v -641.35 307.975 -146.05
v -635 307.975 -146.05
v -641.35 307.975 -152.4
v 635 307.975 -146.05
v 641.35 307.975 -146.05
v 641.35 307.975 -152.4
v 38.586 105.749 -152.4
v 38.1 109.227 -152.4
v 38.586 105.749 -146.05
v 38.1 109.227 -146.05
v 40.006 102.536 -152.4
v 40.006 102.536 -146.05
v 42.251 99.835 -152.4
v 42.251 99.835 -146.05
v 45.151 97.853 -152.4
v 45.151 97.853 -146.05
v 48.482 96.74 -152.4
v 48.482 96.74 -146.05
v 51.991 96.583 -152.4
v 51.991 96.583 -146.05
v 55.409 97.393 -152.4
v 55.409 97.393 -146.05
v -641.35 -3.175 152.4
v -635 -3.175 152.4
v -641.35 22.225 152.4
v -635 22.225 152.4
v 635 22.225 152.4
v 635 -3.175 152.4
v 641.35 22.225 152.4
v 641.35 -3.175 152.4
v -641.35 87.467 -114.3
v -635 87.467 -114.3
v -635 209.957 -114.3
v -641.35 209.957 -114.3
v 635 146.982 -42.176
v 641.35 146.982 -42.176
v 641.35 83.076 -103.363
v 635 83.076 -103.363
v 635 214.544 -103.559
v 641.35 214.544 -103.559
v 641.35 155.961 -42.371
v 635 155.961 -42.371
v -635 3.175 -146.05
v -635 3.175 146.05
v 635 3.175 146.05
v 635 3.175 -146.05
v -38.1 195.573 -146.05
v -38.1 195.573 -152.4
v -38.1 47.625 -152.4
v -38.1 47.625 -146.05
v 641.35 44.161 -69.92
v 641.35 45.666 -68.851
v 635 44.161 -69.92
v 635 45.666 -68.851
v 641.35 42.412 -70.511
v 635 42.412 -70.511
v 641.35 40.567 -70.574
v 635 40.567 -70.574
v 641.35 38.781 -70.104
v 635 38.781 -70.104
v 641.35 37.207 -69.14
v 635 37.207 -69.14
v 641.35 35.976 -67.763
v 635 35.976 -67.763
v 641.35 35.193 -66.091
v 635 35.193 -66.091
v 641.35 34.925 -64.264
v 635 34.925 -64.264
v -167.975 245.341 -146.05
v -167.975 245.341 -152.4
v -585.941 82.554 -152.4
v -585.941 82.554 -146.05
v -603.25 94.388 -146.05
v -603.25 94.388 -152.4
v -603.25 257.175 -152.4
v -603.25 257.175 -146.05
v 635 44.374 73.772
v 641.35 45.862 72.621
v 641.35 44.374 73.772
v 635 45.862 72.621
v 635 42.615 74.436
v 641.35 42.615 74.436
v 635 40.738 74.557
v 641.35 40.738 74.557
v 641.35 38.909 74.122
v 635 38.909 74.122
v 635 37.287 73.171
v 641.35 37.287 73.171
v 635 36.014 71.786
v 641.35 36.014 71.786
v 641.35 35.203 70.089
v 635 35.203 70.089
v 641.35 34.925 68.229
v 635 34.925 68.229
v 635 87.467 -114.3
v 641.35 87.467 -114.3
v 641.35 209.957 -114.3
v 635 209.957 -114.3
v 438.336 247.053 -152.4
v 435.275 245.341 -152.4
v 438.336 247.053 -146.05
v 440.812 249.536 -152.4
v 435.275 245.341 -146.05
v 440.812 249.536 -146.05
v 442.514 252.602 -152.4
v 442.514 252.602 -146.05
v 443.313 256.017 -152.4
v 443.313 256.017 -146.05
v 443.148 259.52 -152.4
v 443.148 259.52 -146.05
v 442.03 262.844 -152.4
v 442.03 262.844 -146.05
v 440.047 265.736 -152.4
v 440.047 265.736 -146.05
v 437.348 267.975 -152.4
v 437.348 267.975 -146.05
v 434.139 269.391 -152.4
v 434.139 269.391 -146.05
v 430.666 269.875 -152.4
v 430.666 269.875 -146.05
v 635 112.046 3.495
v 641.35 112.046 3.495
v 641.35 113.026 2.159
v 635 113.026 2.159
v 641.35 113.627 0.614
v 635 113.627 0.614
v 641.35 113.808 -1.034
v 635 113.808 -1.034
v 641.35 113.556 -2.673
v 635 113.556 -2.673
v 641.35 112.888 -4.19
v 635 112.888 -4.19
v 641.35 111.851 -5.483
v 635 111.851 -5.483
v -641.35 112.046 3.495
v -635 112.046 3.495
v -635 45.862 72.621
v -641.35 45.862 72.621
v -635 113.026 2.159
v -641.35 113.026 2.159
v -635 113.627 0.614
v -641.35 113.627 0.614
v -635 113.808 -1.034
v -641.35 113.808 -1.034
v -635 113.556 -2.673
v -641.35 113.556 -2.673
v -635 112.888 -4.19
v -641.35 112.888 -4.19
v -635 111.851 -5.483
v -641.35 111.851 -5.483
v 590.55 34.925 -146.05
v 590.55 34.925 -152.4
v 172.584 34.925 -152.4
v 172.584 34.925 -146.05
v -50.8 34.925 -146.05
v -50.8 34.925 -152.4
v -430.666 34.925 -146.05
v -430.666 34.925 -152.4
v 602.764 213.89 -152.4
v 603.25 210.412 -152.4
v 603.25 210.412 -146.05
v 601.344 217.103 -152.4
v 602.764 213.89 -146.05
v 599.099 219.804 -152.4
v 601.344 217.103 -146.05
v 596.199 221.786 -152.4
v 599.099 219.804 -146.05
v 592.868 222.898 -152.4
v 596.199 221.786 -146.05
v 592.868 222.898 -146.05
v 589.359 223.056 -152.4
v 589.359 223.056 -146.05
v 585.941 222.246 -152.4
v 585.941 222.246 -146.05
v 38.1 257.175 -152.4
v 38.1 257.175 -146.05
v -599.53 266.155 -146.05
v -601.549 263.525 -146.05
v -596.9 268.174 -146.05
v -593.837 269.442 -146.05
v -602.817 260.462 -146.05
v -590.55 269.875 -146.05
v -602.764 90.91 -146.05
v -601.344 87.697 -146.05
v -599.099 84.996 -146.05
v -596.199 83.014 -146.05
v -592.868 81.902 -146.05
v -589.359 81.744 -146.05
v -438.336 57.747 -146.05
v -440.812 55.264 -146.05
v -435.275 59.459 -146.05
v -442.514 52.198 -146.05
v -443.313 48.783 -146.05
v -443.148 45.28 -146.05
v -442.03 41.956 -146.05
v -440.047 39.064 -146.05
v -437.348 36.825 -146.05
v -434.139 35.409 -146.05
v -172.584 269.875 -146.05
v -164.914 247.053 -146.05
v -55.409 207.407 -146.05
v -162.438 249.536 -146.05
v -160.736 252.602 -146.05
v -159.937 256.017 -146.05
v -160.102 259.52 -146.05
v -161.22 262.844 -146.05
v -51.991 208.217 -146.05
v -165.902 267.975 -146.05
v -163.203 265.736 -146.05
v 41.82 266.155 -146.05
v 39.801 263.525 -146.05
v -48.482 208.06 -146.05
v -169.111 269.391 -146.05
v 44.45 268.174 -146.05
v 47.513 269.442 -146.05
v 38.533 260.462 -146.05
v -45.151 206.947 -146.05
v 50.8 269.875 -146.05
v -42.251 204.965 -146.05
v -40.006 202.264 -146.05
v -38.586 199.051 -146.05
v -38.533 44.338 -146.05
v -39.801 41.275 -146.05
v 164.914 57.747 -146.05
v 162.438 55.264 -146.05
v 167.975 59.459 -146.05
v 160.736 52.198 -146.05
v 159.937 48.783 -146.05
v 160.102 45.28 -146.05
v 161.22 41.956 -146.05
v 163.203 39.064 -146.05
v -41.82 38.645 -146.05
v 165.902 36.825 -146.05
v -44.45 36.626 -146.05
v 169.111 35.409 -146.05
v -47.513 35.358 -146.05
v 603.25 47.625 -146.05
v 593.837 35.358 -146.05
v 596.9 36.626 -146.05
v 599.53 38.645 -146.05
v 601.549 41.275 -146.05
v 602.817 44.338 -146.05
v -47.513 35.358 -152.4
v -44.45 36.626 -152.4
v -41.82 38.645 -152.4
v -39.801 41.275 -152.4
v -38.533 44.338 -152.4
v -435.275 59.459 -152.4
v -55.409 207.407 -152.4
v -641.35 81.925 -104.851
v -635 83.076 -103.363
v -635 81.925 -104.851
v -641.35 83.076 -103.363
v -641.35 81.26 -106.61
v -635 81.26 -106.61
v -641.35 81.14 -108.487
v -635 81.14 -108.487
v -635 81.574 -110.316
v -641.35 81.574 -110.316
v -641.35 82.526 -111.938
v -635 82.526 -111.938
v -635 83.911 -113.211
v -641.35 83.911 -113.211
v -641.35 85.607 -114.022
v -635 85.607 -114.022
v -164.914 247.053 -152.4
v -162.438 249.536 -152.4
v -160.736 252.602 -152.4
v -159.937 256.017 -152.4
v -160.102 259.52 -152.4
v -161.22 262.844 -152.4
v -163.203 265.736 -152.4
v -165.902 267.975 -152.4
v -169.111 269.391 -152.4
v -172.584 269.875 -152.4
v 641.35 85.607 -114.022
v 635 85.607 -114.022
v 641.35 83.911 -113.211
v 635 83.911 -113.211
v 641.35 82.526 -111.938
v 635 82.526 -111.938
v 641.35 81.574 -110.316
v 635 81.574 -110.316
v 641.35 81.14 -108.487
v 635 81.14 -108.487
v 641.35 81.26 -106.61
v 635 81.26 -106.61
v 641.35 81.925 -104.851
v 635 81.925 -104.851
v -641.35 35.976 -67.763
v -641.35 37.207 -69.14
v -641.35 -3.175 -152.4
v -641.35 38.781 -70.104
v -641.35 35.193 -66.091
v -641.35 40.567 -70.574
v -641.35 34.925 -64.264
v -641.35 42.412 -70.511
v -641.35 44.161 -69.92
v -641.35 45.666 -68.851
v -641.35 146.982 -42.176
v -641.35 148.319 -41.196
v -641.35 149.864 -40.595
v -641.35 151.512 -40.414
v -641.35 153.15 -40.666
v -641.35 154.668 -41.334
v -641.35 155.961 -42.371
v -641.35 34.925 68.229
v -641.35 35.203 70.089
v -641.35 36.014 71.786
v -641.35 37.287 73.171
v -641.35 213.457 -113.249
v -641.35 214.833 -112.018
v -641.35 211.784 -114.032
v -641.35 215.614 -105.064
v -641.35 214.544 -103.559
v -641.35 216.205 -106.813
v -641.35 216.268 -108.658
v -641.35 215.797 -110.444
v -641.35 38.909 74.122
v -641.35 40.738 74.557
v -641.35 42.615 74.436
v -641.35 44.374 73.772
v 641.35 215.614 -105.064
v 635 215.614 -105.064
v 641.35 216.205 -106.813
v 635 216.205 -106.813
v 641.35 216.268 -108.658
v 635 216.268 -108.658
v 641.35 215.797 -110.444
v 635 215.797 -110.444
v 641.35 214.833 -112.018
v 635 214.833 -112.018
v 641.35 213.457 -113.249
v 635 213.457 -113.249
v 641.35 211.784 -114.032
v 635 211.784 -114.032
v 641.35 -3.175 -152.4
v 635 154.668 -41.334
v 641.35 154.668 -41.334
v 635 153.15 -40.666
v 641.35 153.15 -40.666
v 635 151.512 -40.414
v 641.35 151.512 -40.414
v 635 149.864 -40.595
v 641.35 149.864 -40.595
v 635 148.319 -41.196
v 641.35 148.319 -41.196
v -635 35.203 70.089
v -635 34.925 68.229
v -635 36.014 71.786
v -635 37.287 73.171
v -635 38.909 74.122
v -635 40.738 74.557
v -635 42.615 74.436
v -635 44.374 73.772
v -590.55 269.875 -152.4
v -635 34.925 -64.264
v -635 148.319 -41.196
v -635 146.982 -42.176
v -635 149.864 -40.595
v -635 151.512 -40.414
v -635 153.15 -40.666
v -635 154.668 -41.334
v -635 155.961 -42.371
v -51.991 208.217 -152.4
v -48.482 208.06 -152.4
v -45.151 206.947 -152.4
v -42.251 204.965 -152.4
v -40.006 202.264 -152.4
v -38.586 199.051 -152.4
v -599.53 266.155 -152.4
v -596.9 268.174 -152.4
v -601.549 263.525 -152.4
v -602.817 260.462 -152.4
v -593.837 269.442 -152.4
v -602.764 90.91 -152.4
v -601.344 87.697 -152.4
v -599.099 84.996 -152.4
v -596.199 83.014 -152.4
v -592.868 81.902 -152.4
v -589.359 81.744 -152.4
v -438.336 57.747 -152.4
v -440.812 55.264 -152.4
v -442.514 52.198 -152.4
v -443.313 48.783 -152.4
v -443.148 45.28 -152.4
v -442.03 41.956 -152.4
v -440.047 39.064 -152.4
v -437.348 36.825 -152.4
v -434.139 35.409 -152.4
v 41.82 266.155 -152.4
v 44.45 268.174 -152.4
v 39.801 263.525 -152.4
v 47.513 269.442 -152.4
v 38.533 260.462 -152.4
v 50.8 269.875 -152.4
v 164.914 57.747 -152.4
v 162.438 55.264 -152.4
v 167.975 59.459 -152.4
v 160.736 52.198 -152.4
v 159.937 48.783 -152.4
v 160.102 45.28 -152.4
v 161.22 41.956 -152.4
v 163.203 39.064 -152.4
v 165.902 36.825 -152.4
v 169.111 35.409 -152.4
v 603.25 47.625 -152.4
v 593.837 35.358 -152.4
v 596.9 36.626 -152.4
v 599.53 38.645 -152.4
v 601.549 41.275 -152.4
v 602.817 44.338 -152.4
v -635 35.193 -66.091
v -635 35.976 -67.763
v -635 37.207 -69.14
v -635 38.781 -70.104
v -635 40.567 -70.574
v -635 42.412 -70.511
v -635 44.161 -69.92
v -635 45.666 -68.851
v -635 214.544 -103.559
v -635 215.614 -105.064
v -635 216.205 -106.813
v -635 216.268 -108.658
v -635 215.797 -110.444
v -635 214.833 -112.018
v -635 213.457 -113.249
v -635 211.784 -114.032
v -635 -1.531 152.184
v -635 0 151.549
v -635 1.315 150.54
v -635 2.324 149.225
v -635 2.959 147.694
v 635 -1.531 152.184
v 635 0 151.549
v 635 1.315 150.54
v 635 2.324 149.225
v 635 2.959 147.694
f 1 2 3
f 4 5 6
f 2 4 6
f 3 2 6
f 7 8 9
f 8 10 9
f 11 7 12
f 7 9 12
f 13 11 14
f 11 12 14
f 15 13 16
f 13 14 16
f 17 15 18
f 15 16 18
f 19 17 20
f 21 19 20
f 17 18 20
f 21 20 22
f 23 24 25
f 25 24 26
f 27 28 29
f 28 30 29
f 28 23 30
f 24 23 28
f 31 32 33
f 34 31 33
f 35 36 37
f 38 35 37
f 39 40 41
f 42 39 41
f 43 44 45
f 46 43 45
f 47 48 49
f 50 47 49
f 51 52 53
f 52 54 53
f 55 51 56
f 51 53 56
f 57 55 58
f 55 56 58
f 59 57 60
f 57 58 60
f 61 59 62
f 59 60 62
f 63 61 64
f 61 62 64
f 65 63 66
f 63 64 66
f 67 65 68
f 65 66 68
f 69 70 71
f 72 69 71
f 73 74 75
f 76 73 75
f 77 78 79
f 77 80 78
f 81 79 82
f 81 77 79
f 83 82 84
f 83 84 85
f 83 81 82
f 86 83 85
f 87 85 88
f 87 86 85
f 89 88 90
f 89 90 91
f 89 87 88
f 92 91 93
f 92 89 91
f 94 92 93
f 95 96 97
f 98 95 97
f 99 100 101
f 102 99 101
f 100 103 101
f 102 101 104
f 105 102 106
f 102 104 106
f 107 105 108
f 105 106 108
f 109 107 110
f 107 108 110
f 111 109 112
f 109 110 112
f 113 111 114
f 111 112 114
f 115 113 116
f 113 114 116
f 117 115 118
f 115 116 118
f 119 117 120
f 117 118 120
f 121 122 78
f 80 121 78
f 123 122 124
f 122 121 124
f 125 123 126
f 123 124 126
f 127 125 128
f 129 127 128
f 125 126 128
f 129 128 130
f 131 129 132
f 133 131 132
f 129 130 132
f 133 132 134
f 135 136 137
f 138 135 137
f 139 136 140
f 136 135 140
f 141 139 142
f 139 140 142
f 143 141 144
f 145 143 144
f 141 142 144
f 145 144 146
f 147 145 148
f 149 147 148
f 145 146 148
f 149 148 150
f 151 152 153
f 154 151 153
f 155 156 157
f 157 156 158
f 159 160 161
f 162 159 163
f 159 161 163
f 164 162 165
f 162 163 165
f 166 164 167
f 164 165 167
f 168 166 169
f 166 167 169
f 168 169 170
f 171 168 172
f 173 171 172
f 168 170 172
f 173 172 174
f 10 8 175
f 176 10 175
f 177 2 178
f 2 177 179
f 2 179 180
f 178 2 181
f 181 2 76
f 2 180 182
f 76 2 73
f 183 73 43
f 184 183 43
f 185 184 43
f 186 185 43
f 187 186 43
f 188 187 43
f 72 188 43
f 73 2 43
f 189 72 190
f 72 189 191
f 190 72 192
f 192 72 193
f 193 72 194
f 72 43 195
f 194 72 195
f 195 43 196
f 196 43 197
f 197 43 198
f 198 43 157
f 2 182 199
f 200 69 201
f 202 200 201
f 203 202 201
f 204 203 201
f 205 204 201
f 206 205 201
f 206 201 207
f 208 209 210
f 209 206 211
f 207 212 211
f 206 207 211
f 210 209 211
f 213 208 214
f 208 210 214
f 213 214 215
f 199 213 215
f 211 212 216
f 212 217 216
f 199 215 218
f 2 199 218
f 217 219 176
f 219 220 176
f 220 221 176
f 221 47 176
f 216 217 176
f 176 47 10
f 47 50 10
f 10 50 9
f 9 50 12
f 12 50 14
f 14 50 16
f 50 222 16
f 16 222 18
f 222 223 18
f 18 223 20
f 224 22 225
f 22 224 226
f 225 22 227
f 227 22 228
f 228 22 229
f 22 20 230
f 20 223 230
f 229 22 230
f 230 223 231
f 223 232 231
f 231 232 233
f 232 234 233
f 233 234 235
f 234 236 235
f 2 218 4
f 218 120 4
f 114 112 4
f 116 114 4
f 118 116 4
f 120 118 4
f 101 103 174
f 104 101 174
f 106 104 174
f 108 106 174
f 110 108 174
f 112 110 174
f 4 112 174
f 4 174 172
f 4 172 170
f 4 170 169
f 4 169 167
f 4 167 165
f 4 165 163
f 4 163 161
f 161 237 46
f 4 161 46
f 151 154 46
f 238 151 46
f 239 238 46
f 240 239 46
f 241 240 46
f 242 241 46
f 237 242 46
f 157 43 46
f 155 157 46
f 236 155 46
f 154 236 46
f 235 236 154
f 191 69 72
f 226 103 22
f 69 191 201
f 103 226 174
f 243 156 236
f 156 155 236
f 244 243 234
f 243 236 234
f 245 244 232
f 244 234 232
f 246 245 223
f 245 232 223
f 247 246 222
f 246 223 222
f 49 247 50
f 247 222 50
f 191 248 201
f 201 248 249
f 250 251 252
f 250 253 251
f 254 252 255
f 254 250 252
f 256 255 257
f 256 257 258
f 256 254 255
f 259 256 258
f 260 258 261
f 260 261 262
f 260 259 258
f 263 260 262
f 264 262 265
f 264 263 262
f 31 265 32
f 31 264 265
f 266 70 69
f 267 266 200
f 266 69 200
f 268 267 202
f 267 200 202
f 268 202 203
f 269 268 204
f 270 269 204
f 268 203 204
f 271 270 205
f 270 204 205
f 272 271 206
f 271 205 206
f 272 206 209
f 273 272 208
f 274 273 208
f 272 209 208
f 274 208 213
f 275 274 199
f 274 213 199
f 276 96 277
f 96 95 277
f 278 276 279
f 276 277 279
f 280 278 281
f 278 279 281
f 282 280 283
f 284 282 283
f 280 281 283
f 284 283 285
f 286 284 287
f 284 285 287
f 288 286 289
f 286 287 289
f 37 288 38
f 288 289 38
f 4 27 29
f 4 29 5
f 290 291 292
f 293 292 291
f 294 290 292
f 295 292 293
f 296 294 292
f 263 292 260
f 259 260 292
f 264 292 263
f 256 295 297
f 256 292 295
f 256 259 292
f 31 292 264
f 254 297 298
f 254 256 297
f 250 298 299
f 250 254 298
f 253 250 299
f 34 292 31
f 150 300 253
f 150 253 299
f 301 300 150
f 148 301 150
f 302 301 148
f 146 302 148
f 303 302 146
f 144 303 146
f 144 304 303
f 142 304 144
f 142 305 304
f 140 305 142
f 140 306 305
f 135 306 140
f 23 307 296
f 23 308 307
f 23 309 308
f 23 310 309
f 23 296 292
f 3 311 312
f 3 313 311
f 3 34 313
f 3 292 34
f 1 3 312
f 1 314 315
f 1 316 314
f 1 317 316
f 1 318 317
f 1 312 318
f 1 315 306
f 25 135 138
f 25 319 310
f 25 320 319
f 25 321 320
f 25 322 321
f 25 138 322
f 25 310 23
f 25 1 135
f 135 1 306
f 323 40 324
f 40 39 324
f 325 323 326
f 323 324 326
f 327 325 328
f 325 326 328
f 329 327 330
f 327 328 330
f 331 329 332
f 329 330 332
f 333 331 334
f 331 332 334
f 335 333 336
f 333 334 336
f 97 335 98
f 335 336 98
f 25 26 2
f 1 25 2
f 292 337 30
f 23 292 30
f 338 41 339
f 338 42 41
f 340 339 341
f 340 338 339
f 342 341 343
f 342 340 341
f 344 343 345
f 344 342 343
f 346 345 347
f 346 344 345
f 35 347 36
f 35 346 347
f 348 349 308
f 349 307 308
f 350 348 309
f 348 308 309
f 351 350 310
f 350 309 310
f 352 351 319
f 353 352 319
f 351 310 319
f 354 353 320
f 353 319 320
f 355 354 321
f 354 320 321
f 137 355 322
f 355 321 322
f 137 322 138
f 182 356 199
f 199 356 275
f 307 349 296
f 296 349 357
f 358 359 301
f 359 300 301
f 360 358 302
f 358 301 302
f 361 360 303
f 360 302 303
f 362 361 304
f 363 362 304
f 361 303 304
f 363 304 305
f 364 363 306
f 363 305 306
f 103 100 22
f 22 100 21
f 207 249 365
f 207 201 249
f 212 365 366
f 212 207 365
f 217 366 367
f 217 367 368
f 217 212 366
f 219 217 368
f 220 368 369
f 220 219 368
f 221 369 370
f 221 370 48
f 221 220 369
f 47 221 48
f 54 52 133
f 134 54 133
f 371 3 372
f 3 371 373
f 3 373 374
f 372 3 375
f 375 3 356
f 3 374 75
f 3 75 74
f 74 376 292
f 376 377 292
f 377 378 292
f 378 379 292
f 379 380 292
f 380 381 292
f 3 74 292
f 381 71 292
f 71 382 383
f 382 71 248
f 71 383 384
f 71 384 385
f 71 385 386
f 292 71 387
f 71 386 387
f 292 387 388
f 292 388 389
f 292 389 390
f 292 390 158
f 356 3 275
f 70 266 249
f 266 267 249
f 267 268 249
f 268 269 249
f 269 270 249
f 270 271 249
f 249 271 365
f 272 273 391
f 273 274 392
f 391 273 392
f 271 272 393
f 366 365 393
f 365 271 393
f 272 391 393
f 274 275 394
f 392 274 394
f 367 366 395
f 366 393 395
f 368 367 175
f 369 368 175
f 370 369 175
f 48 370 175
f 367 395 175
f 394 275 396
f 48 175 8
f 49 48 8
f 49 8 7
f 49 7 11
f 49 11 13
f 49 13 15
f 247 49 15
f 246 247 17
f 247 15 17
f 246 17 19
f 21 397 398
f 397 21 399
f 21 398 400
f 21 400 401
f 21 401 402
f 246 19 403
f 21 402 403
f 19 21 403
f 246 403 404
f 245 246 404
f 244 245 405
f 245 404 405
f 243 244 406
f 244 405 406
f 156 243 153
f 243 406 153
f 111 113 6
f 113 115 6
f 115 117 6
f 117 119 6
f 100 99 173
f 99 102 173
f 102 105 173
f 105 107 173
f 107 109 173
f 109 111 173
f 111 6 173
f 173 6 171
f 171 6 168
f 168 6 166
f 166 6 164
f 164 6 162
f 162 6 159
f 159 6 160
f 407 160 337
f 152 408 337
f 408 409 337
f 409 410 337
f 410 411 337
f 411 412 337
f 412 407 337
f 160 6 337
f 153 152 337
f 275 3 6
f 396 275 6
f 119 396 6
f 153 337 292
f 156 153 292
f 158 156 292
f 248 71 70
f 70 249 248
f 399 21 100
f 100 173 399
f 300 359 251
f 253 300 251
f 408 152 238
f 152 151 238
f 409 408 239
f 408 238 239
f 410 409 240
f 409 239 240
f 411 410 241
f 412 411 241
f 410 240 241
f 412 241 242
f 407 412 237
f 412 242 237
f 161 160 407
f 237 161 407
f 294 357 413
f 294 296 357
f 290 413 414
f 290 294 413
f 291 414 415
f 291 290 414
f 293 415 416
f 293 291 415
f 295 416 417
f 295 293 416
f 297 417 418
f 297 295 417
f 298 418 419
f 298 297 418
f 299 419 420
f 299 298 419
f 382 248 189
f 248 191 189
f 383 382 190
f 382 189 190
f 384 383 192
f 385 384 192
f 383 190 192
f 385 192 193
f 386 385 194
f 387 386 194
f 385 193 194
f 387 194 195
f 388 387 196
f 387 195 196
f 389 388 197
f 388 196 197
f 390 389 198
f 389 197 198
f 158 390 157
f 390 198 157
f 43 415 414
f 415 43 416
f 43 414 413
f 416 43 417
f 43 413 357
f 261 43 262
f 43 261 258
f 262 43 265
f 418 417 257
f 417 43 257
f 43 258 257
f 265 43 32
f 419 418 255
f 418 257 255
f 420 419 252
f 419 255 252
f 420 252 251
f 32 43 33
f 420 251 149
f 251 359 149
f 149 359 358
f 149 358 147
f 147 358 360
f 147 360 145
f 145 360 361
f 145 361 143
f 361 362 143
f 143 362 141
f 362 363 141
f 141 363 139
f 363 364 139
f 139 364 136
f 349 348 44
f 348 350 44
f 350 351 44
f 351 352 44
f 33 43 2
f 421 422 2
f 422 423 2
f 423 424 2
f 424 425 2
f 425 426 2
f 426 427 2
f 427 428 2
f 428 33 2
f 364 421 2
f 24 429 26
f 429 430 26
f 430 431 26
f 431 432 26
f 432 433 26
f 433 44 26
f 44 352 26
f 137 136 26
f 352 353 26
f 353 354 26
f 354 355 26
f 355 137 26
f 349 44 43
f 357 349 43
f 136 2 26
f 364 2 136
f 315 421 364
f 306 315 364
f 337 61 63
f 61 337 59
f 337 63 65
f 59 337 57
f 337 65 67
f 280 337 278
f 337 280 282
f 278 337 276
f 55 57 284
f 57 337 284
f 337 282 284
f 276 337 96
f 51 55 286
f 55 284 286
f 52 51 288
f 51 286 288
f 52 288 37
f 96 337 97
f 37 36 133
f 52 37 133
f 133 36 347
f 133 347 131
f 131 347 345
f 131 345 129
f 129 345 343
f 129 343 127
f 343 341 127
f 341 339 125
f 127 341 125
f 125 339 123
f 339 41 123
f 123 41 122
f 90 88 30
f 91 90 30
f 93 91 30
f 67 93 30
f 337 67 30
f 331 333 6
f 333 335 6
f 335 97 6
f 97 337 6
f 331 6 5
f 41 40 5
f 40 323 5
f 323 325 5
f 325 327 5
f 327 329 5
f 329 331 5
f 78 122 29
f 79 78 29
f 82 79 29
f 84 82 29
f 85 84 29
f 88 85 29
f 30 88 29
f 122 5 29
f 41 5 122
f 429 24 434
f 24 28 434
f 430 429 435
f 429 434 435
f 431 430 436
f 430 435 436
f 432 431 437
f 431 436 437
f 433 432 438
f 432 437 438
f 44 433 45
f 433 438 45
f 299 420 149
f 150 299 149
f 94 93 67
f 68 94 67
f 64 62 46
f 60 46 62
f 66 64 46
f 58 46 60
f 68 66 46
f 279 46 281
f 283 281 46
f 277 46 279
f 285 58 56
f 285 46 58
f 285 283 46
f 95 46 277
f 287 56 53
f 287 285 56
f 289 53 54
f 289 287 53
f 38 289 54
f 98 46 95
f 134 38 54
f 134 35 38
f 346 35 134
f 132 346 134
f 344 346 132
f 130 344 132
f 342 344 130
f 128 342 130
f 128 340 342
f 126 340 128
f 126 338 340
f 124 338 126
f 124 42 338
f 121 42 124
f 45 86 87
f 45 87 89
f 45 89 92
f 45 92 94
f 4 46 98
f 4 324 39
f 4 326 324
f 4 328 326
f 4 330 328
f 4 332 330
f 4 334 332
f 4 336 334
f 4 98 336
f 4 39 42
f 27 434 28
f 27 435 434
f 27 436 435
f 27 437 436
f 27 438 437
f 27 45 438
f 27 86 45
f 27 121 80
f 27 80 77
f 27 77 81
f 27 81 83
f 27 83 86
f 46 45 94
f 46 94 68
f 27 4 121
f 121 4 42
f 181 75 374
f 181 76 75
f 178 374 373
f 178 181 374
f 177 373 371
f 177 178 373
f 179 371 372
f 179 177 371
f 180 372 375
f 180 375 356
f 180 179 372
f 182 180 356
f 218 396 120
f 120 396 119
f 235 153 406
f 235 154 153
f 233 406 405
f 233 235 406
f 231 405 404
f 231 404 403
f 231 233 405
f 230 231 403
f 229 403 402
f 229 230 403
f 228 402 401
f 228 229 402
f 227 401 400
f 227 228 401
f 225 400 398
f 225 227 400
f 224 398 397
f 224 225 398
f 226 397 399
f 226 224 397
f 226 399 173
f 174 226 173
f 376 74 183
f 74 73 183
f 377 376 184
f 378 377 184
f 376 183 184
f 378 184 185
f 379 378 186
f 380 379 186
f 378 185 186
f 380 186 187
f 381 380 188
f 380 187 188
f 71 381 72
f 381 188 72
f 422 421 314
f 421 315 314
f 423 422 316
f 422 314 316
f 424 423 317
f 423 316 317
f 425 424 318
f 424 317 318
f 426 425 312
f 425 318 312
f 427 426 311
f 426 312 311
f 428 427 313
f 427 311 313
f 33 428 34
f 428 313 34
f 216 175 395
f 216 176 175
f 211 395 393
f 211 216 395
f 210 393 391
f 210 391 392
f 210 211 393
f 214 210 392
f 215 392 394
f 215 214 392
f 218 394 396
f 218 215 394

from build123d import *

# Parameters (mm, degrees)
SKETCH1_W           = 1270
SKETCH1_H           = 6.35
BOSS_EXTRUDE1_DEPTH = 152.4
SKETCH2_W           = 1270
SKETCH2_H           = 6.35
BOSS_EXTRUDE2_DEPTH = 304.8
BOSS_EXTRUDE3_DEPTH = 6.35
CUT_EXTRUDE1_DEPTH  = 1328.92833038
FILLET1_R           = 6.35
FILLET2_R           = 6.35
CUT_EXTRUDE2_DEPTH  = 775.003529142
FILLET3_R           = 12.7
FILLET4_R           = 6.35


with BuildPart() as part:
    # Sketch1 → Boss-Extrude1 (new, symmetric)
    with BuildSketch(Plane.XY):
        Rectangle(SKETCH1_W, SKETCH1_H)
    extrude(amount=BOSS_EXTRUDE1_DEPTH, both=True)

    # Sketch2 → Boss-Extrude2 (add)
    with BuildSketch(Plane(origin=(0, 3.175, 0), x_dir=(1, 0, 0), z_dir=(0, 1, 0))):
        with Locations((0, 149.225)):
            Rectangle(SKETCH2_W, SKETCH2_H)
    extrude(amount=BOSS_EXTRUDE2_DEPTH)

    # Sketch3 → Boss-Extrude3 (add)
    with BuildSketch(Plane(origin=(635, 0, 0), x_dir=(0, 0, -1), z_dir=(1, 0, 0))):
        Polygon((152.4, -3.175), (-152.4, -3.175), (-152.4, 22.225), (146.05, 307.975), (152.4, 307.975), align=None)
    boss_extrude3 = extrude(amount=BOSS_EXTRUDE3_DEPTH)

    # Mirror1: Boss-Extrude3 across plane
    add(boss_extrude3.mirror(Plane(origin=(0, 0, 0), x_dir=(0, 0, 1), z_dir=(1, 0, 0))))

    # Sketch4 → Cut-Extrude1 (cut, through all)
    with BuildSketch(Plane(origin=(641.35, 0, 0), x_dir=(0, 0, -1), z_dir=(1, 0, 0))):
        Polygon((-84.04363802, 34.925), (79.134946254, 34.925), (1.09133899, 116.437212031), align=None)
        Polygon((37.784585908, 151.569044186), (114.3, 71.652945024), (114.3, 224.82848321), align=None)
    extrude(amount=-CUT_EXTRUDE1_DEPTH, mode=Mode.SUBTRACT)

    # Fillet1
    fillet1_edges = [part.edges().sort_by_distance(p)[0] for p in [
        (638.175, 34.925, -79.134946254),
        (638.175, 34.925, 84.04363802),
        (638.175, 116.437212031, -1.09133899),
        (638.175, 71.652945024, -114.3),
        (638.175, 151.569044186, -37.784585908),
        (638.175, 224.82848321, -114.3),
    ]]
    fillet(fillet1_edges, radius=FILLET1_R)

    # Fillet2
    fillet2_edges = [part.edges().sort_by_distance(p)[0] for p in [
        (-638.175, 34.925, -79.134946254),
        (-638.175, 34.925, 84.04363802),
        (-638.175, 116.437212031, -1.09133899),
        (-638.175, 71.652945024, -114.3),
        (-638.175, 151.569044186, -37.784585908),
        (-638.175, 224.82848321, -114.3),
    ]]
    fillet(fillet2_edges, radius=FILLET2_R)

    # Sketch5 → Cut-Extrude2 (cut, through all)
    with BuildSketch(Plane(origin=(0, 0, -152.4), x_dir=(-1, 0, 0), z_dir=(0, 0, -1))):
        Polygon((-38.1, 269.875), (-498.26805665, 269.875), (-38.1, 90.65165162), align=None)
        Polygon((-104.98194335, 34.925), (-603.25, 228.987295748), (-603.25, 34.925), align=None)
        Polygon((38.1, 214.14834838), (38.1, 34.925), (498.26805665, 34.925), align=None)
        Polygon((603.25, 269.875), (104.98194335, 269.875), (603.25, 75.812704252), align=None)
    extrude(amount=-CUT_EXTRUDE2_DEPTH, mode=Mode.SUBTRACT)

    # Fillet3
    fillet3_edges = [part.edges().sort_by_distance(p)[0] for p in [
        (38.1, 90.65165162, -149.225),
        (498.26805665, 269.875, -149.225),
        (38.1, 269.875, -149.225),
        (603.25, 34.925, -149.225),
        (603.25, 228.987295748, -149.225),
        (104.98194335, 34.925, -149.225),
        (-38.1, 214.14834838, -149.225),
        (-498.26805665, 34.925, -149.225),
        (-38.1, 34.925, -149.225),
        (-104.98194335, 269.875, -149.225),
        (-603.25, 269.875, -149.225),
        (-603.25, 75.812704252, -149.225),
    ]]
    fillet(fillet3_edges, radius=FILLET3_R)

    # Fillet4
    fillet4_edges = [part.edges().sort_by_distance(p)[0] for p in [
        (0, 3.175, 152.4),
    ]]
    fillet(fillet4_edges, radius=FILLET4_R - 0.0001)  # a hair under: the kernel refuses the full size


solid = part.part
